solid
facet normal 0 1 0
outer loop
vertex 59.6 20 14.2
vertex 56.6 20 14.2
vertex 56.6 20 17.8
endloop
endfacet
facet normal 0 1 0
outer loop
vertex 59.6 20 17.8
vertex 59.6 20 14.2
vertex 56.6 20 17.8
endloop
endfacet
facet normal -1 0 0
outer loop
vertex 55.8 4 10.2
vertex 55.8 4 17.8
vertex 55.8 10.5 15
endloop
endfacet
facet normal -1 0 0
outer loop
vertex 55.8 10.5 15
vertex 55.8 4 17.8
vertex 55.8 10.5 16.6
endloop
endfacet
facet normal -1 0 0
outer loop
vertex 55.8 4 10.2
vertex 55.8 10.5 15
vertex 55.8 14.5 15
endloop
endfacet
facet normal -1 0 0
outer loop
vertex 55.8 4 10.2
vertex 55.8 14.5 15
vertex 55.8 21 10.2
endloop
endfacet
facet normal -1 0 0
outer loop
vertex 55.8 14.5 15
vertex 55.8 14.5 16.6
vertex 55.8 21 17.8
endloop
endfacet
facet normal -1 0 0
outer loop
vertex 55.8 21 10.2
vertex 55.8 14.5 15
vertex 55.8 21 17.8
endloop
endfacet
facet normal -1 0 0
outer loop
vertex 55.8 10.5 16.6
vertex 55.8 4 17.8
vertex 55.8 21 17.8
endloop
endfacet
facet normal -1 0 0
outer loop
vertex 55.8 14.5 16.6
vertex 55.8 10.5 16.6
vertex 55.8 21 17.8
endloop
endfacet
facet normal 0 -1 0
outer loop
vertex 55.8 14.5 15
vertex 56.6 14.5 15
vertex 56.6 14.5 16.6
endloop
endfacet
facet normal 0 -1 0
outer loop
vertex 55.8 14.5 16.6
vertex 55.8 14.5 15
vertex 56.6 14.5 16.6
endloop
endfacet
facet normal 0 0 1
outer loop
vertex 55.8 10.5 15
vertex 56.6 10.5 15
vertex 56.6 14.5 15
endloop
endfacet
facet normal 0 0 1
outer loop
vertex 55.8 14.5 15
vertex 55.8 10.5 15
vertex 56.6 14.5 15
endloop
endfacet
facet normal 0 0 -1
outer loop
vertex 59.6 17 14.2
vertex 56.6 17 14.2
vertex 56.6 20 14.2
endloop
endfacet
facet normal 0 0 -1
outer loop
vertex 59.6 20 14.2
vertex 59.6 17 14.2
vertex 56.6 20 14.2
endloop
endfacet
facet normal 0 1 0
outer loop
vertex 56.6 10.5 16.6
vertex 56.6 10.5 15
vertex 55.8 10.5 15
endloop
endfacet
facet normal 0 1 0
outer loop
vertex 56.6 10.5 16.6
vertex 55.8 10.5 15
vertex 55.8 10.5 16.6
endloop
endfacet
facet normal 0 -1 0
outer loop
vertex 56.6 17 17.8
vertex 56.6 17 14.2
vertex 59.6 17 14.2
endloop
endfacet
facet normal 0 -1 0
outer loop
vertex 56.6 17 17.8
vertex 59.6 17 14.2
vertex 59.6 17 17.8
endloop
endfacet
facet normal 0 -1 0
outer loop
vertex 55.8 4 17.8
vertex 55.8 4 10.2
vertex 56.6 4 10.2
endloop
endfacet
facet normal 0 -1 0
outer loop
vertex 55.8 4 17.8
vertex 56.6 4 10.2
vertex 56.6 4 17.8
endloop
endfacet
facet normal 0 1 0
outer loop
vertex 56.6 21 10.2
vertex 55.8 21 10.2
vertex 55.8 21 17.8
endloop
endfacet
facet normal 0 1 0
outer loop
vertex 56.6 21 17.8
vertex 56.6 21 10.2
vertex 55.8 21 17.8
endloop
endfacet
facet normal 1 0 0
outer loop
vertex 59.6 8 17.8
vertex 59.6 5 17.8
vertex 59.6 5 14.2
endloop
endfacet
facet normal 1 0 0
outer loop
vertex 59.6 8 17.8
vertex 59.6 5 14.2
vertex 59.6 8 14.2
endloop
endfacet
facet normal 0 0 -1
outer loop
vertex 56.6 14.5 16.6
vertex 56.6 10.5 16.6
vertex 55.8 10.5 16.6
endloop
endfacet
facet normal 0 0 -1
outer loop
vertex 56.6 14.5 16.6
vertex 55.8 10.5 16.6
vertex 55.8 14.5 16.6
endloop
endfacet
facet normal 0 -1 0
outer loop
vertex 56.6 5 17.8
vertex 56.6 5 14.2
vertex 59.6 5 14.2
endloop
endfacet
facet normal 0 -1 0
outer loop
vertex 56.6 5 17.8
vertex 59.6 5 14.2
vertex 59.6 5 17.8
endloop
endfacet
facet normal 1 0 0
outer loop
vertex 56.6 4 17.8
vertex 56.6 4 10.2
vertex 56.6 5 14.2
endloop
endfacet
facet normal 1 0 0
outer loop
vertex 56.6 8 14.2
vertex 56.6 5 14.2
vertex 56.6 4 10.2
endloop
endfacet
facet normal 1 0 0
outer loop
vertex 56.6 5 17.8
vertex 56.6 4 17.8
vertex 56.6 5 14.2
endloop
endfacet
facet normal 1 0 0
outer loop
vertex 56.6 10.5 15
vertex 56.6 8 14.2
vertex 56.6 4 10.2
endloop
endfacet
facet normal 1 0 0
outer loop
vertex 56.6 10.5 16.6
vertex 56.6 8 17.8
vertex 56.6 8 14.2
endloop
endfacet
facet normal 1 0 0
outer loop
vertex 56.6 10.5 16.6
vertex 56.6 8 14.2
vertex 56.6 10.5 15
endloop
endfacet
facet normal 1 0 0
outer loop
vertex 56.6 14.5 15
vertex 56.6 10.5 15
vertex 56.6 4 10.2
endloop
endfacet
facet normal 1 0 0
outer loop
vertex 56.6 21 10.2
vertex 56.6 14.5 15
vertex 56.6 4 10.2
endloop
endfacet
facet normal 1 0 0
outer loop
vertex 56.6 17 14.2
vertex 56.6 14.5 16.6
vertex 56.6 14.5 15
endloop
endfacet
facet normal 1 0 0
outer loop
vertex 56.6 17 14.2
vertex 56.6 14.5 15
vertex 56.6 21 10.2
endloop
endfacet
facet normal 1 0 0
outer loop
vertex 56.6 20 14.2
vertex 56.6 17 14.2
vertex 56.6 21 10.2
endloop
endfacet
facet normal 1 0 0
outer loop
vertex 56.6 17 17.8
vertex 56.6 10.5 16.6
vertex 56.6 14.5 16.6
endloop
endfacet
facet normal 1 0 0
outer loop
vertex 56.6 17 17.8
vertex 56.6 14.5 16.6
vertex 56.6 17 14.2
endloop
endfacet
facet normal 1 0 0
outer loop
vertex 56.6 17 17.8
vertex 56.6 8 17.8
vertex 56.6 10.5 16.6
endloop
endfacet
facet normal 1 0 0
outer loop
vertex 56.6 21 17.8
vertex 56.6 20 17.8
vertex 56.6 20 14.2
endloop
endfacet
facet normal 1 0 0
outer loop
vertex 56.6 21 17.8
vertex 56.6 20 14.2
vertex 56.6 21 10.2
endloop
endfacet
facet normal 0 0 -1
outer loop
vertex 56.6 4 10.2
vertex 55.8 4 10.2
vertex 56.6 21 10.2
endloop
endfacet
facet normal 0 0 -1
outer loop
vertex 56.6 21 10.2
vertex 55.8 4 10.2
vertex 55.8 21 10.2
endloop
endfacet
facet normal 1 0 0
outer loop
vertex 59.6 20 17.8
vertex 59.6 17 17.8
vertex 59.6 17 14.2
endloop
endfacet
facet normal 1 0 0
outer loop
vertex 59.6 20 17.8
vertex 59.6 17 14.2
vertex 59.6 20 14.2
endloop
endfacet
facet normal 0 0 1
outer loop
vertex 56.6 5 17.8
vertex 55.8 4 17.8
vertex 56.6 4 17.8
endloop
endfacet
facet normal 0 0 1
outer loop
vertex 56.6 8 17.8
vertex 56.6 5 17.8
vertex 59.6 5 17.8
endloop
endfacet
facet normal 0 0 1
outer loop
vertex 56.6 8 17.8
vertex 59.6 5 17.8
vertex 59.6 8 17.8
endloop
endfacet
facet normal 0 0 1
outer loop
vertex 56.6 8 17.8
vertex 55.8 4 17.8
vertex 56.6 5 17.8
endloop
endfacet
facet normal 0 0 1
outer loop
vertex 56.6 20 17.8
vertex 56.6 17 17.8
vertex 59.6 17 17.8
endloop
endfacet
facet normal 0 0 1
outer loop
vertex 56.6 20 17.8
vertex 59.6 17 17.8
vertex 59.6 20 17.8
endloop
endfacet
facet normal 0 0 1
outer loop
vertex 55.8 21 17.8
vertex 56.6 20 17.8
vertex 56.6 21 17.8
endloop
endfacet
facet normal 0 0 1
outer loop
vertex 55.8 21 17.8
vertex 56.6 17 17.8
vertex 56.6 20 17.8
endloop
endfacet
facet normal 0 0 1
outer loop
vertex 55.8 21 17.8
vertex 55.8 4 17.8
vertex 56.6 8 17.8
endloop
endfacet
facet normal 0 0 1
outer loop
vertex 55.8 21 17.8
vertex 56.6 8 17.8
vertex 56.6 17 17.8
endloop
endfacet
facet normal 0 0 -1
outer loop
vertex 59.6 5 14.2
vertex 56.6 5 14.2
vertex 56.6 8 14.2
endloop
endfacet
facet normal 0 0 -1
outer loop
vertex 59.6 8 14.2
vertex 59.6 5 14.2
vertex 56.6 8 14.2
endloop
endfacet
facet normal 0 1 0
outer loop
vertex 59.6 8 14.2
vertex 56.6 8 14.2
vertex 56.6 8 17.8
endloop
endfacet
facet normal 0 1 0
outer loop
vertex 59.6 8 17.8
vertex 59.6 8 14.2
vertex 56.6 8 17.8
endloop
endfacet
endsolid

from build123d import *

# Parameters (mm, degrees)
SKETCH049_W     = 17
SKETCH049_H     = 7.6
PAD022_DEPTH    = 0.8
SKETCH050_W     = 3
SKETCH050_H     = 3.6
PAD023_DEPTH    = 3
SKETCH051_W     = 4
SKETCH051_H     = 1.6
POCKET017_DEPTH = 0.801


with BuildPart() as part:
    # Sketch049 → Pad022 (new body)
    with BuildSketch(Plane.YZ):
        Rectangle(SKETCH049_W, SKETCH049_H)
    extrude(amount=PAD022_DEPTH)

    # Sketch050 (on Face6 of Pad022) → Pad023 (join)
    with BuildSketch(Plane.YZ.offset(0.8)):
        with Locations((-6, 2)):
            Rectangle(SKETCH050_W, SKETCH050_H)
        with Locations((6, 2)):
            Rectangle(SKETCH050_W, SKETCH050_H)
    extrude(amount=PAD023_DEPTH)

    # Sketch051 (on Face5 of Pad023) → Pocket017 (cut, through all)
    with BuildSketch(Plane.YZ.offset(0.8)):
        with Locations((0, 1.8)):
            Rectangle(SKETCH051_W, SKETCH051_H)
    extrude(amount=-POCKET017_DEPTH, mode=Mode.SUBTRACT)


with BuildPart() as part_1:
    # Body006 placement: moved
    add(part.part.moved(Location((55.8, 12.5, 14))))


solid = part_1.part
